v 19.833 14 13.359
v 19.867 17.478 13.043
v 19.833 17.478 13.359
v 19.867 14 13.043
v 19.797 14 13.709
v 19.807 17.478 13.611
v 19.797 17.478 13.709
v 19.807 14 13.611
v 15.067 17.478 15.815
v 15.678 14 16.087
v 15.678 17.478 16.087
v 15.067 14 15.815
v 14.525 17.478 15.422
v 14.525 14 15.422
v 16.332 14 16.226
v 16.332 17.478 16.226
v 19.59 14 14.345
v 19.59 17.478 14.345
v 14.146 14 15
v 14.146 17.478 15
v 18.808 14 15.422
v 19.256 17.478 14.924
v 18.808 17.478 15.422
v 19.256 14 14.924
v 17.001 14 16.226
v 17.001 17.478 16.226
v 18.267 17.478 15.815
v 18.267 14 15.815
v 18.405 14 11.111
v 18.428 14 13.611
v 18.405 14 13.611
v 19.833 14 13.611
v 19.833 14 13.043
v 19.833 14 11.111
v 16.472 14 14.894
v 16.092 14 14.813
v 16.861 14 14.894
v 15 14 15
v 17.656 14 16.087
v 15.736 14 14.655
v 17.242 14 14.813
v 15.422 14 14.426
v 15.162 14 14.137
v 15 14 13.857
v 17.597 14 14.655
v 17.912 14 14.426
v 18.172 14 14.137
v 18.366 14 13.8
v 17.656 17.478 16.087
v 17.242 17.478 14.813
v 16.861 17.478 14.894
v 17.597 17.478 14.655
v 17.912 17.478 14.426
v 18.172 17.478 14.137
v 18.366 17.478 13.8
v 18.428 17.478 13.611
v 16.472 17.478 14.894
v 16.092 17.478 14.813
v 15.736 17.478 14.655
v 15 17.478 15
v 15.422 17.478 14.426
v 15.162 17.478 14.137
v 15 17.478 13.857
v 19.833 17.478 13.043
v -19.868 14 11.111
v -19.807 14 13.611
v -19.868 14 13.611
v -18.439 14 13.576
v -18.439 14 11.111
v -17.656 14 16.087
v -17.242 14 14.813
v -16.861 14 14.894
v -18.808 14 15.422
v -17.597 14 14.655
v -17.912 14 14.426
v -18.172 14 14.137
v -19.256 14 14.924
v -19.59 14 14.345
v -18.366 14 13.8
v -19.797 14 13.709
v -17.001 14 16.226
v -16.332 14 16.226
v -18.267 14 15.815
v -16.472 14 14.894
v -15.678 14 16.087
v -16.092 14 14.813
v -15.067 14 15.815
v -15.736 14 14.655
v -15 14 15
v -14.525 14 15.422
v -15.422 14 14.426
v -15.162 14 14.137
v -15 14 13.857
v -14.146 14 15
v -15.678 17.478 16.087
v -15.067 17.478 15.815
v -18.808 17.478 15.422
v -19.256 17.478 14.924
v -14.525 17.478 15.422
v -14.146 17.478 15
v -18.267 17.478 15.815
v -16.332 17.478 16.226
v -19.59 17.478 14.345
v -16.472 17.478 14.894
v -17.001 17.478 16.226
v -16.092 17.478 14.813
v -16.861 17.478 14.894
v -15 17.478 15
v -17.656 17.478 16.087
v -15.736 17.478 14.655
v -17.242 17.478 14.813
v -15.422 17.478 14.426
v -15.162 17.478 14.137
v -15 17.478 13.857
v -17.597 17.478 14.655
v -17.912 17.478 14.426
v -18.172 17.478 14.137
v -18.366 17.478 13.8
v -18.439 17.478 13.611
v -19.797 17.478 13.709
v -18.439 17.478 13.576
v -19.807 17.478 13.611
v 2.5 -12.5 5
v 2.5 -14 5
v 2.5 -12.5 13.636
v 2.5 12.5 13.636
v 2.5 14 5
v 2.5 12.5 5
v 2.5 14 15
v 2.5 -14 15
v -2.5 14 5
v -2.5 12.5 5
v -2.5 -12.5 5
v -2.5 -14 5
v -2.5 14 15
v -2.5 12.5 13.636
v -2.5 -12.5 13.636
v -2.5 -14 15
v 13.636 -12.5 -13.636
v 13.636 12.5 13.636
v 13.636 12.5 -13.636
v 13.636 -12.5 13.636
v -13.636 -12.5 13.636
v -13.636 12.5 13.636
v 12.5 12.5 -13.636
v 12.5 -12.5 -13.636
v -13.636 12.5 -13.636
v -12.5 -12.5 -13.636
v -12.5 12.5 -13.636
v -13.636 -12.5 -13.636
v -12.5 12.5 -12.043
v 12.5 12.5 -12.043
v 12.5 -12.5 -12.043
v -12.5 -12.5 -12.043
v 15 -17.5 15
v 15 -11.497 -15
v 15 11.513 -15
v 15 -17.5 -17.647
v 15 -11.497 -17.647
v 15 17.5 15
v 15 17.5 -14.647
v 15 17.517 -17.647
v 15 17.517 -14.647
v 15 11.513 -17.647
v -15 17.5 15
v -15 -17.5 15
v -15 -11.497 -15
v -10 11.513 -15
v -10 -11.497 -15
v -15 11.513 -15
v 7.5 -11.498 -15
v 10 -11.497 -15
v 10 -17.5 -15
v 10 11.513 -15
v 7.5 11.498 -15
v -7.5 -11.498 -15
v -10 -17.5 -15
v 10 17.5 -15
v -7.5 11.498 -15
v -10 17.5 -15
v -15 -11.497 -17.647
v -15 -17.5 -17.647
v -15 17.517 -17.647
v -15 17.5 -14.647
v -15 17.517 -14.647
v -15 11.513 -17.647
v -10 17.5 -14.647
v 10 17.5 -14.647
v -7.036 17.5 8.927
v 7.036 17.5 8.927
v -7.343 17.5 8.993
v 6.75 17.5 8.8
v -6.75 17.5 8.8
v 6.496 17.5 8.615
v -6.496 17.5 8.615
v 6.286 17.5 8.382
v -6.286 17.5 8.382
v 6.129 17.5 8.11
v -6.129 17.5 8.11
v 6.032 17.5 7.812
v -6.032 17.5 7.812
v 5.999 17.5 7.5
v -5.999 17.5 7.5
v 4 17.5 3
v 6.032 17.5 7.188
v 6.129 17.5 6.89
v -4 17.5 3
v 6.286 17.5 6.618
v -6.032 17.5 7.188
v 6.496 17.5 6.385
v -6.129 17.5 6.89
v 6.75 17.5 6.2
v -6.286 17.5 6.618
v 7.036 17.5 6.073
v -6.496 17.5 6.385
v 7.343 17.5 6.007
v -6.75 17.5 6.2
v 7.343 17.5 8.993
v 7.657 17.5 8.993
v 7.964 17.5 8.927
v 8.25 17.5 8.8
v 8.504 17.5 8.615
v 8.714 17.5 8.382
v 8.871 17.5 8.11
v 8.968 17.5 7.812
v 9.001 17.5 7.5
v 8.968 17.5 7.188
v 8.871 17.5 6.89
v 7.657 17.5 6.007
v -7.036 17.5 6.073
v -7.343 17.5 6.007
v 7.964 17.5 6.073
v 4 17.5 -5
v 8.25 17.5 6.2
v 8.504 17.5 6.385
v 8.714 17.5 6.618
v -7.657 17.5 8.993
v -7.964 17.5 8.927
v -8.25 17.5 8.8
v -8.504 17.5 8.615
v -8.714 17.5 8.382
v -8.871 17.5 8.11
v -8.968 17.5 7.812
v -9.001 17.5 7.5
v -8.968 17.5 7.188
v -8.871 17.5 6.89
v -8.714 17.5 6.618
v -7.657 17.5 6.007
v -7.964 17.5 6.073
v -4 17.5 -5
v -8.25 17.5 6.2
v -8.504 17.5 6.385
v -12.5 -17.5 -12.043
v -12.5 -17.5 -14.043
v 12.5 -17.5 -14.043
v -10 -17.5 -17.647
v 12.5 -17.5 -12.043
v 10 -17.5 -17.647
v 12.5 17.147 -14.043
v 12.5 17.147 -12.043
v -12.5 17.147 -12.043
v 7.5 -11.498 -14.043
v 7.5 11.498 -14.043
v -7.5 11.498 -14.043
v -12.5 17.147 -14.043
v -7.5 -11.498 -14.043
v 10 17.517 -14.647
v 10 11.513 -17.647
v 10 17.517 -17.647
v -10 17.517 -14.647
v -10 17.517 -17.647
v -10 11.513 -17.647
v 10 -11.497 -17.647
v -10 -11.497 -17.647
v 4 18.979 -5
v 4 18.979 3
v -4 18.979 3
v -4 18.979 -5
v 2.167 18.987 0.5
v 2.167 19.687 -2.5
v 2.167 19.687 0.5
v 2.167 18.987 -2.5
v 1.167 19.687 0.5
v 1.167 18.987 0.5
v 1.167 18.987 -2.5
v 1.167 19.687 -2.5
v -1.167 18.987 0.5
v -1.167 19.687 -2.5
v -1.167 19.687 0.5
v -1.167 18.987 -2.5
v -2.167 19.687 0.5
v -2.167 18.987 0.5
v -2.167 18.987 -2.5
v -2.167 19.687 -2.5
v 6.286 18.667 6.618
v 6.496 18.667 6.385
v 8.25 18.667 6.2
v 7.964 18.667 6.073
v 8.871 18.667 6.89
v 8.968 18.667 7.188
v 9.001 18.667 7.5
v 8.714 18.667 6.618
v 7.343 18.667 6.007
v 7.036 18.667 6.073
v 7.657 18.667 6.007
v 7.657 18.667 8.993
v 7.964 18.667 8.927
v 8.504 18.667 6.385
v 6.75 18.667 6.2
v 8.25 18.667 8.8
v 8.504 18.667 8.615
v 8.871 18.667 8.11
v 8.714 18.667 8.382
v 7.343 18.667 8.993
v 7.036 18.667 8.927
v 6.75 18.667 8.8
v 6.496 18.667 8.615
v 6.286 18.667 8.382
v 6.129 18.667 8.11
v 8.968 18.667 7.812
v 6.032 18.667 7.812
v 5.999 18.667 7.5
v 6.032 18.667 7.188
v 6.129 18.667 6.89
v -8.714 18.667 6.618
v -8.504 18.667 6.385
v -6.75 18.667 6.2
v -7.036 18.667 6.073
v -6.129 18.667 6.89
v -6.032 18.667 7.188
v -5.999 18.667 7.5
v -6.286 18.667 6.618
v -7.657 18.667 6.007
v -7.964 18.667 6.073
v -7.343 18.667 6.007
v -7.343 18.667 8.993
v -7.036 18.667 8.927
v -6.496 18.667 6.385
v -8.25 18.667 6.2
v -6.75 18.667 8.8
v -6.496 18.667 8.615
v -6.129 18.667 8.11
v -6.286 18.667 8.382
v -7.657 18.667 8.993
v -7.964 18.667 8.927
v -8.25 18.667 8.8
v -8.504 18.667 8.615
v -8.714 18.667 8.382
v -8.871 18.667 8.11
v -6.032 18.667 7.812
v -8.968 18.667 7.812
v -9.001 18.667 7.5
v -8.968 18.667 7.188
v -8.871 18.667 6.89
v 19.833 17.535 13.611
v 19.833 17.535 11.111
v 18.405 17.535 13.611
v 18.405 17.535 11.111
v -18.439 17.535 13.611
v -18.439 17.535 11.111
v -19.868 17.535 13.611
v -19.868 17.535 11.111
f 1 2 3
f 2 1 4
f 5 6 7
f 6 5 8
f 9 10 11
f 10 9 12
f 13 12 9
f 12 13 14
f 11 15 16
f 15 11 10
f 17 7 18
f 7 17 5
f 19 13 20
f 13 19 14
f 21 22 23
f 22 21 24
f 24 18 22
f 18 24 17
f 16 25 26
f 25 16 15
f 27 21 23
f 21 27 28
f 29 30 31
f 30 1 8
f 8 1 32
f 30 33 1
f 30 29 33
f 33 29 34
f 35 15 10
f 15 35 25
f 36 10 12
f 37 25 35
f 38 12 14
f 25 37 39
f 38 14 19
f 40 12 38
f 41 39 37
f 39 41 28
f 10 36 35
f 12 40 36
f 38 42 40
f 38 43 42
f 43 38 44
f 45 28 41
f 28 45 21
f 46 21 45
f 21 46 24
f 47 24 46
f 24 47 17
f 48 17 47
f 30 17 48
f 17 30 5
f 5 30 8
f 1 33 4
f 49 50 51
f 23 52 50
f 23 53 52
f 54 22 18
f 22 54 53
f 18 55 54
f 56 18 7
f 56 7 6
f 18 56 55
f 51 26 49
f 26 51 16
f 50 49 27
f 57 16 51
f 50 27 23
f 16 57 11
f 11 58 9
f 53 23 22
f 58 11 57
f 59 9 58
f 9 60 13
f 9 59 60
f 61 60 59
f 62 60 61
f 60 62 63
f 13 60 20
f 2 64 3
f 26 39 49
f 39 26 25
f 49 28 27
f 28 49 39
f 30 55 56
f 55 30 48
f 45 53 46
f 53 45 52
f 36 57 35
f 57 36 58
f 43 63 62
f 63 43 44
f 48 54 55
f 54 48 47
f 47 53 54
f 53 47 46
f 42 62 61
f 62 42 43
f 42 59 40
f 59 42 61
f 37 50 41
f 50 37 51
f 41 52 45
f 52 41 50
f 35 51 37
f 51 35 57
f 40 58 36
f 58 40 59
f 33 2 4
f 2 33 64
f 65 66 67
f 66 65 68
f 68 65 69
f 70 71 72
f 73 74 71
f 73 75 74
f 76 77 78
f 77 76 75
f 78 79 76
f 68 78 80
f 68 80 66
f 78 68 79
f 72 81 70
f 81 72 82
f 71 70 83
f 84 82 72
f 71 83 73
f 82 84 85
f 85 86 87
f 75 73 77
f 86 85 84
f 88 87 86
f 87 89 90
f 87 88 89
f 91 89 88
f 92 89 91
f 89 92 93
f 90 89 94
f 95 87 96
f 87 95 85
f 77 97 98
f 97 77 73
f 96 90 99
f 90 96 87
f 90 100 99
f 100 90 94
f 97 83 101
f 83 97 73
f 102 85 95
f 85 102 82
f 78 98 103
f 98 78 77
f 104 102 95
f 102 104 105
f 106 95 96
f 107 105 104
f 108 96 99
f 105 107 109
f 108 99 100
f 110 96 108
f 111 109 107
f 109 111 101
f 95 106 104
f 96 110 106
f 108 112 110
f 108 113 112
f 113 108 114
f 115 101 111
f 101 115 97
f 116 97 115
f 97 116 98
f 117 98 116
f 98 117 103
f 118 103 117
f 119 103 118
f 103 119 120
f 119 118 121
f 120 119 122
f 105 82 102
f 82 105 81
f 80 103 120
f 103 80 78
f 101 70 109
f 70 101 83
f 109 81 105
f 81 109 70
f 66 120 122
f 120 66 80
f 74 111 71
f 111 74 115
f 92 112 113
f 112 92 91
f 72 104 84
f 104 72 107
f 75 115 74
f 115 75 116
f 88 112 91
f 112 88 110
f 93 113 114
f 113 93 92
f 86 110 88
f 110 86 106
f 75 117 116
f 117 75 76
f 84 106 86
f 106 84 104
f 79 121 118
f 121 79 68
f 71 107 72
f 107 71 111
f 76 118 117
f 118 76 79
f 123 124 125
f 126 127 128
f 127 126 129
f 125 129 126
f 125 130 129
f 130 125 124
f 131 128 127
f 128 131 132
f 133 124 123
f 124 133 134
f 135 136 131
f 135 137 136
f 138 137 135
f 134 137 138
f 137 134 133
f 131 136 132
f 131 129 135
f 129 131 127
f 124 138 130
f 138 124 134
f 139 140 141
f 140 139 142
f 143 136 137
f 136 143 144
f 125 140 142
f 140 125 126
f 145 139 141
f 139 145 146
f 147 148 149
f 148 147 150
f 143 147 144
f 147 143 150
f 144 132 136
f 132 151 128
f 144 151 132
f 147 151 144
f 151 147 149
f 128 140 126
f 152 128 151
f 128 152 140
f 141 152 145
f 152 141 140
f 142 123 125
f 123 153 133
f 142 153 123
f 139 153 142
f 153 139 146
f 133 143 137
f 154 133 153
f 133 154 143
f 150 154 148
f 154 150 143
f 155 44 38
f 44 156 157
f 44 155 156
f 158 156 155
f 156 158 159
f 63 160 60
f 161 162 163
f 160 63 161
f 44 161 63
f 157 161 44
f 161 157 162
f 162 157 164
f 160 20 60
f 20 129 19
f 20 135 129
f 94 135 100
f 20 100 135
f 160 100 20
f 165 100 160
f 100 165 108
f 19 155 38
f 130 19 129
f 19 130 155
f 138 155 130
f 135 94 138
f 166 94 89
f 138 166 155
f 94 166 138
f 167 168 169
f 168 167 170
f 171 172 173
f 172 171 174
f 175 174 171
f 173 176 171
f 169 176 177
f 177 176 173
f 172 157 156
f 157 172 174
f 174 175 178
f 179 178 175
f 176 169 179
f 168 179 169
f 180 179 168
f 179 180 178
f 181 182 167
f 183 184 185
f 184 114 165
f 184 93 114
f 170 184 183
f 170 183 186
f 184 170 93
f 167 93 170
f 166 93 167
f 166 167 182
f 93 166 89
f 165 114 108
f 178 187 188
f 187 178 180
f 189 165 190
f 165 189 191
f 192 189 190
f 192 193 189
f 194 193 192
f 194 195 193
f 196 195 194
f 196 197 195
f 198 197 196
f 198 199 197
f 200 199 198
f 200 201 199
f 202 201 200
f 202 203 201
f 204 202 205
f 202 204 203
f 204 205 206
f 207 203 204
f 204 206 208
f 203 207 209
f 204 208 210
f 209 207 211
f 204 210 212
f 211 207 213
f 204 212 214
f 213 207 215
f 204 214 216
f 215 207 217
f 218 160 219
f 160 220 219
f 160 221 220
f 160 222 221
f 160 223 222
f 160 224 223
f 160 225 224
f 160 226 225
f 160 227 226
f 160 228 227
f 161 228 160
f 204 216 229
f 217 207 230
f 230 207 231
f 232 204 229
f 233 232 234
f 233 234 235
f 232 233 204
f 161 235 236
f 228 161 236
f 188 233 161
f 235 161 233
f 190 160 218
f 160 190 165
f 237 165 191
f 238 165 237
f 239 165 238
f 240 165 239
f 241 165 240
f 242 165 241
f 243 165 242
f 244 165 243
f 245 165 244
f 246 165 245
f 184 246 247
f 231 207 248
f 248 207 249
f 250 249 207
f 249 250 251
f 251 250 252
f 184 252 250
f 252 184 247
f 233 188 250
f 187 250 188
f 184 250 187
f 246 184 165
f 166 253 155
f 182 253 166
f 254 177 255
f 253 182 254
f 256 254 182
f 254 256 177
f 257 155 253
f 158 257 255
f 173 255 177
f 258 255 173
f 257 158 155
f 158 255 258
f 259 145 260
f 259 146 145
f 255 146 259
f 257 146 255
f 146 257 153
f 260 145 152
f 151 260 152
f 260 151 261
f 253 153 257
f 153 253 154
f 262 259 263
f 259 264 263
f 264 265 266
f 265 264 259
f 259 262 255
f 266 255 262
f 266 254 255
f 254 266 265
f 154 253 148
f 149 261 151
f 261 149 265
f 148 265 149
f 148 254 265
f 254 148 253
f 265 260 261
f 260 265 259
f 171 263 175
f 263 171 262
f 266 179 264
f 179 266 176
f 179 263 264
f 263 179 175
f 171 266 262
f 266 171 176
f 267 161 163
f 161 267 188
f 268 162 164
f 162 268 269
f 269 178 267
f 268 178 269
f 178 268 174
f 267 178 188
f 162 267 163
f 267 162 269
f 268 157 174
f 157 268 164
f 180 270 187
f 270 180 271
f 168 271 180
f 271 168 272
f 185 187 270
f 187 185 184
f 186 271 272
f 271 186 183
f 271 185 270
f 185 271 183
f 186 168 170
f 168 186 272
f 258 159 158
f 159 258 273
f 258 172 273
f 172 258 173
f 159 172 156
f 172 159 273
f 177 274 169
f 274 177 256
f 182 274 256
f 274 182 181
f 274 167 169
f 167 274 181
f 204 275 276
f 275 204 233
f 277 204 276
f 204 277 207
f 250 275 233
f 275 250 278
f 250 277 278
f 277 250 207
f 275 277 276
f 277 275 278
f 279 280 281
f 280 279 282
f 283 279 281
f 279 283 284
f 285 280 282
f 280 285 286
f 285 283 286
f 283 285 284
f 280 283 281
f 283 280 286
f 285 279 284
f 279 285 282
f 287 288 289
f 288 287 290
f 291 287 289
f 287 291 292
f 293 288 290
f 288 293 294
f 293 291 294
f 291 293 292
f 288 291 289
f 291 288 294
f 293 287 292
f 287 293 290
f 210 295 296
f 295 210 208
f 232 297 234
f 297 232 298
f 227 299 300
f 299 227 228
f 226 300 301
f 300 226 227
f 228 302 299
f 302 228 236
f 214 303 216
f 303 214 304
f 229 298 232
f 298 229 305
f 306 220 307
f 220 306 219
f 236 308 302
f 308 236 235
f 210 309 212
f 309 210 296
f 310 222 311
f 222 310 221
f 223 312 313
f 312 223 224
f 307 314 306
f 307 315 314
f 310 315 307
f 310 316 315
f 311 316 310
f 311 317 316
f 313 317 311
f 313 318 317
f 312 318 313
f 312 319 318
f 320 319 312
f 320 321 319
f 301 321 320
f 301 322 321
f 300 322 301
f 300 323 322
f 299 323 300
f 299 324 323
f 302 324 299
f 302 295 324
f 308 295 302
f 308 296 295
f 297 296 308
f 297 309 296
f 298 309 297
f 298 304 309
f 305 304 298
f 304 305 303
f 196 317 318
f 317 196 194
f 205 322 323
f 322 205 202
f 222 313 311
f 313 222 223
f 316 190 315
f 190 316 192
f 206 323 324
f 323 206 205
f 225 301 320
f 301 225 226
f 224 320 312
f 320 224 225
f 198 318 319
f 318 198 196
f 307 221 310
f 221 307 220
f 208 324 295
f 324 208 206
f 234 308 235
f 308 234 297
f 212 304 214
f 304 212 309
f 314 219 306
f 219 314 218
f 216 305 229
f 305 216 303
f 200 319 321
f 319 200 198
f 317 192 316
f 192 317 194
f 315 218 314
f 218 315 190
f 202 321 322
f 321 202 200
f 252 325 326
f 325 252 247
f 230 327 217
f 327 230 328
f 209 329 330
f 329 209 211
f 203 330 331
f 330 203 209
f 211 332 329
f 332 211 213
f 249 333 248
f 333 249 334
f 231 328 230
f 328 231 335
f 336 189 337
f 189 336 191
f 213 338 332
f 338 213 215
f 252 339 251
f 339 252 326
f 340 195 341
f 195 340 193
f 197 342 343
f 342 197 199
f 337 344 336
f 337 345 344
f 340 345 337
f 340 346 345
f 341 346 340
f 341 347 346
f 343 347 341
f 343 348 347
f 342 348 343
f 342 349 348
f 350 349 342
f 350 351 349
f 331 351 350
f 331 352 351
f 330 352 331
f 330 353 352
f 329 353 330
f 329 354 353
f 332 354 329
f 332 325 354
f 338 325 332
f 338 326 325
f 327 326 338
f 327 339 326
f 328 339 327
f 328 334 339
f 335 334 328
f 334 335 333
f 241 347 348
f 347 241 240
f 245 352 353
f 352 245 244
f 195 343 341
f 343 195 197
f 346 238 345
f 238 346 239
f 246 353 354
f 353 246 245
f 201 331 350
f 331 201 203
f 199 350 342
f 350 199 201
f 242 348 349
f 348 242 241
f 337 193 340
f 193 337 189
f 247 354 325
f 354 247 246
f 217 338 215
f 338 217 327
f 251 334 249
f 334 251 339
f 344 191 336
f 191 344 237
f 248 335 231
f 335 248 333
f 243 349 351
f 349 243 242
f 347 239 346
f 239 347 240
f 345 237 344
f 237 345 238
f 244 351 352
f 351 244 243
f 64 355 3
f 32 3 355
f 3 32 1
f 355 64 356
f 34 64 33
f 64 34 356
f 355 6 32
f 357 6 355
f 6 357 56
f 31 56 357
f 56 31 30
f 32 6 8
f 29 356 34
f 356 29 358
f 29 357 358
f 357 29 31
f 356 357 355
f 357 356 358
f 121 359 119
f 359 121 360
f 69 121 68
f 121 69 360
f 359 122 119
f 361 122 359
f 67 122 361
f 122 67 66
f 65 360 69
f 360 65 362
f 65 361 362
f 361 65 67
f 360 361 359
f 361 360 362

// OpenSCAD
$fn=30;
width=30;
depth=35;
height=30;
diameter=8;
//
//jambe
//
translate([width/3,depth/3.04,-height/1.7])cube([width/6,depth/5.83,height/10]);
translate([-width/2,depth/3.04,-height/1.7])cube([width/6,depth/5.83,height/10]);
translate([width/3,-depth/2,-height/1.7])cube([width/6,depth/5.83,height/10]);
translate([-width/2,-depth/2,-height/1.7])cube([width/6,depth/5.83,height/10]);
//
//nez
//
translate([0,depth/1.92,height/6-6])cube([width/3.75,depth/23.33,height/3.75],center=true);
//
//narine
//
translate([width/18,depth/1.81,height/6-6])cube([width/30,depth/50,height/10],center=true);
translate([-width/18,depth/1.81,height/6-6])cube([width/30,depth/50,height/10],center=true);
//
//yeux
//
translate([width/4,depth/2.1,height/4])rotate([270,0,0])cylinder(h=diameter/4,r=diameter/5.33);
translate([-width/4,depth/2.1,height/4])rotate([270,0,0])cylinder(h=diameter/4,r=diameter/5.33);
//
//oreille
//
translate([width/1.63,depth/2.5,height/2.7])cube([width/21,depth/9.9,height/12]);
intersection()
{
difference()
{
translate([width/1.8,depth/2.5,height/2.3])rotate([270,0,0])cylinder(h=diameter/2.3,r=diameter/2.5);
translate([width/1.8,depth/2.5,height/2.3])rotate([270,0,0])cylinder(h=diameter/2.3,r=diameter/4.3);
}
translate([width/2.5,depth/2.7,height/2.3])cube([width/3,depth/7,height/2.5]);
}
//
//oreille 2
//
translate([-width/1.51,depth/2.5,height/2.7])cube([width/21,depth/9.9,height/12]);
intersection()
{
difference()
{
translate([-width/1.8,depth/2.5,height/2.3])rotate([270,0,0])cylinder(h=diameter/2.3,r=diameter/2.5);
translate([-width/1.8,depth/2.5,height/2.3])rotate([270,0,0])cylinder(h=diameter/2.3,r=diameter/4.3);
}
translate([-width/1.4,depth/2.7,height/2.3])cube([width/3,depth/7,height/2.5]);
}
//
//trous pour argent
//
difference()
{
cube([width,depth,height],center=true);
union() {
translate([0,0,height/1.5])cube([width/6,depth/1.25,height],center=true);
cube([width/1.1,depth/1.4,height/1.1],center=true);
}
translate([0,-depth/8-2,-height/2.3])cube([width/1.2,depth/0.744,height/15],center=true);
translate([0,0,-height/2])cube([width/2,depth/1.522,height/1.25],center=true);
}
